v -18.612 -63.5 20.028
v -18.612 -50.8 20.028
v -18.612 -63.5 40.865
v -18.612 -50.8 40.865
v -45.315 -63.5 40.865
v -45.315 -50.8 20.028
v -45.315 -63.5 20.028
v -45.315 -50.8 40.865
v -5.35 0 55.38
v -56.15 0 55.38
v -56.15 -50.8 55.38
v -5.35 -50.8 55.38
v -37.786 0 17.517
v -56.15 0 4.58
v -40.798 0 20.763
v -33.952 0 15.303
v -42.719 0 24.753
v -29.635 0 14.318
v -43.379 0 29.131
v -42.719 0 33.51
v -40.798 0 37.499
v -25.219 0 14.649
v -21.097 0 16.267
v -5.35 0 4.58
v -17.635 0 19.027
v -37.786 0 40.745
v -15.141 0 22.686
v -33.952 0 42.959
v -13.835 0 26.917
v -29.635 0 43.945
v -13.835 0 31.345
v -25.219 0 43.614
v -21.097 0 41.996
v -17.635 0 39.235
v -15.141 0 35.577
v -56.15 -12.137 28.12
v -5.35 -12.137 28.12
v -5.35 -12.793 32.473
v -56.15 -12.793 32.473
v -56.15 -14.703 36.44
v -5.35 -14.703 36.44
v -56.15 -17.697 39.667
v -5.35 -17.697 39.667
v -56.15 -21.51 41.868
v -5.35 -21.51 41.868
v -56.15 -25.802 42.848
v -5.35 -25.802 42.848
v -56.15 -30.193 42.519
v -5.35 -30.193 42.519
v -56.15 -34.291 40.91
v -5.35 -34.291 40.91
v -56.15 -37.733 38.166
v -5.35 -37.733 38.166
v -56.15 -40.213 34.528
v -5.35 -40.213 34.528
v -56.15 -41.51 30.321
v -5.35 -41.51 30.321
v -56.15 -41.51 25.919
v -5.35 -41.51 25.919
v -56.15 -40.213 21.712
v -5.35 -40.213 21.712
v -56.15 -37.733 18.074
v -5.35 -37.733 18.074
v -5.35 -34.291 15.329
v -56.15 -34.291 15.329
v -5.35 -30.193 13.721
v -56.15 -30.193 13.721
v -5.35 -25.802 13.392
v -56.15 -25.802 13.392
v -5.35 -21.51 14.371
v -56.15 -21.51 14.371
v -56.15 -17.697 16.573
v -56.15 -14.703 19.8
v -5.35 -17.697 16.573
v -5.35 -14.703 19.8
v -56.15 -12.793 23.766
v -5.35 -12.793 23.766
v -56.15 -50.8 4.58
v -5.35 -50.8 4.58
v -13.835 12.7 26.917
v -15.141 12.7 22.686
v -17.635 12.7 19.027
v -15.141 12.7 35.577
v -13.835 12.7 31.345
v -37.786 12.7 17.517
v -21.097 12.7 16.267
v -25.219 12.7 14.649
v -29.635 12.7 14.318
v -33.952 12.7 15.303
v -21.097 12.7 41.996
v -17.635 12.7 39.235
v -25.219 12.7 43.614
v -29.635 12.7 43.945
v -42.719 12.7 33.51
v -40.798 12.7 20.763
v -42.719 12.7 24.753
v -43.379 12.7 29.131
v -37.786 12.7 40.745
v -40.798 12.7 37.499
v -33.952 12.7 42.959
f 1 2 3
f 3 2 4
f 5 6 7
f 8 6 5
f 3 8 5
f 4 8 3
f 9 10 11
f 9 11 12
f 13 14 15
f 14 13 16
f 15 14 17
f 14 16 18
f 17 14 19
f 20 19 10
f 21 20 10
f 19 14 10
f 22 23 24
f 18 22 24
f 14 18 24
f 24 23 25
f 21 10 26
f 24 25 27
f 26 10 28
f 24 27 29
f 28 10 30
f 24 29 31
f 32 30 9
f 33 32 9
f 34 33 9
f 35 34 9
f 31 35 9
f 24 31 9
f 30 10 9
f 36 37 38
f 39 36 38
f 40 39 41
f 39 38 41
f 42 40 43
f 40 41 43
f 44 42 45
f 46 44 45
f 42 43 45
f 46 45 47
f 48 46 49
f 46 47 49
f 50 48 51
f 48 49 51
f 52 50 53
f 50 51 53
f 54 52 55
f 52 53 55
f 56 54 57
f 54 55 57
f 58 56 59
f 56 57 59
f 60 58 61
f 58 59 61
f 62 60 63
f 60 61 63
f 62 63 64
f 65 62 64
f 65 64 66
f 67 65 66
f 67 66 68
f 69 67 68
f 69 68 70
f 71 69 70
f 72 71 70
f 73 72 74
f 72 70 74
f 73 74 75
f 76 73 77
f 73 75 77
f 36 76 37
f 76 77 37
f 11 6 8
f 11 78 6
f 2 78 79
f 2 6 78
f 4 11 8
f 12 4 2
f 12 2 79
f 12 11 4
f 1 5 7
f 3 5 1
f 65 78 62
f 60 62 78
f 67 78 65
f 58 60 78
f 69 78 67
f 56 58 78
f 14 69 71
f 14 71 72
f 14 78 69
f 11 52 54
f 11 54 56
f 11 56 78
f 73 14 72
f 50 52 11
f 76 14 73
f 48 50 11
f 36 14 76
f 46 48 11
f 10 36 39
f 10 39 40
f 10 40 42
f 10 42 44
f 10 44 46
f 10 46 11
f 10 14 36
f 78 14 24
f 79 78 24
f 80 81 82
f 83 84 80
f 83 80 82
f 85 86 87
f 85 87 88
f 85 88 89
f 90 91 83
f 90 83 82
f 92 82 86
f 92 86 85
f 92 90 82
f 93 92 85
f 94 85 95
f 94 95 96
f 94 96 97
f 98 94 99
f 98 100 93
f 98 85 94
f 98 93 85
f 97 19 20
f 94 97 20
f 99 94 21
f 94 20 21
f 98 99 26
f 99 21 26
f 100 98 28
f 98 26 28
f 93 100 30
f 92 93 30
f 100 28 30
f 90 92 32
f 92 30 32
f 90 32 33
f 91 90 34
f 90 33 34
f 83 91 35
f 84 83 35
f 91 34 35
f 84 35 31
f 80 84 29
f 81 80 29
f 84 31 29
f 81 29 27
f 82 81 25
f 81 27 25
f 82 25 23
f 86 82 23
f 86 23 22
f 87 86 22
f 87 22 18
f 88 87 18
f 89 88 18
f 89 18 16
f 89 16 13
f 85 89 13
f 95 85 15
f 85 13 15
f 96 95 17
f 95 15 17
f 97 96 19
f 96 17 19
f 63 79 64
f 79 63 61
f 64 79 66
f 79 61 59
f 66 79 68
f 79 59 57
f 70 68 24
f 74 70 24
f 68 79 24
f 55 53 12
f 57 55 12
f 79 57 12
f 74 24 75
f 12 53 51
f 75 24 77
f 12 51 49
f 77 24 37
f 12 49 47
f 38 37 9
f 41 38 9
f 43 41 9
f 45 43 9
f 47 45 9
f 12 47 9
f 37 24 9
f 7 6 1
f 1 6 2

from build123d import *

# Parameters (mm, degrees)
F0_W     = 50.8
F0_H     = 50.8
F1_DEPTH = 50.8
F2_R     = 14.76935
F3_DEPTH = 50.8
F4_R     = 14.855001
F5_DEPTH = 12.7
F6_W     = 26.703719
F6_H     = 20.836989
F7_DEPTH = 12.7


with BuildPart() as f1:
    # F0 (on Front) → F1 (new body)
    with BuildSketch(Plane.XZ):
        with Locations((-30.750444, 29.979647)):
            Rectangle(F0_W, F0_H)
    extrude(amount=F1_DEPTH)

    # F2 (on face) → F3 (cut)
    with BuildSketch(Plane.YZ.offset(-5.350444)):
        with Locations((-26.906017, 28.119825)):
            Circle(F2_R)
    extrude(amount=-F3_DEPTH, mode=Mode.SUBTRACT)

    # F4 (on face) → F5 (join)
    with BuildSketch(Plane(origin=(0, 0, 0), x_dir=(-1, 0, 0), z_dir=(0, 1, 0))):
        with Locations((28.524423, 29.131327)):
            Circle(F4_R)
    extrude(amount=F5_DEPTH)

    # F6 (on face) → F7 (join)
    with BuildSketch(Plane.XZ.offset(50.8)):
        with Locations((-31.963541, 30.446282)):
            Rectangle(F6_W, F6_H)
    extrude(amount=F7_DEPTH)


solid = f1.part
